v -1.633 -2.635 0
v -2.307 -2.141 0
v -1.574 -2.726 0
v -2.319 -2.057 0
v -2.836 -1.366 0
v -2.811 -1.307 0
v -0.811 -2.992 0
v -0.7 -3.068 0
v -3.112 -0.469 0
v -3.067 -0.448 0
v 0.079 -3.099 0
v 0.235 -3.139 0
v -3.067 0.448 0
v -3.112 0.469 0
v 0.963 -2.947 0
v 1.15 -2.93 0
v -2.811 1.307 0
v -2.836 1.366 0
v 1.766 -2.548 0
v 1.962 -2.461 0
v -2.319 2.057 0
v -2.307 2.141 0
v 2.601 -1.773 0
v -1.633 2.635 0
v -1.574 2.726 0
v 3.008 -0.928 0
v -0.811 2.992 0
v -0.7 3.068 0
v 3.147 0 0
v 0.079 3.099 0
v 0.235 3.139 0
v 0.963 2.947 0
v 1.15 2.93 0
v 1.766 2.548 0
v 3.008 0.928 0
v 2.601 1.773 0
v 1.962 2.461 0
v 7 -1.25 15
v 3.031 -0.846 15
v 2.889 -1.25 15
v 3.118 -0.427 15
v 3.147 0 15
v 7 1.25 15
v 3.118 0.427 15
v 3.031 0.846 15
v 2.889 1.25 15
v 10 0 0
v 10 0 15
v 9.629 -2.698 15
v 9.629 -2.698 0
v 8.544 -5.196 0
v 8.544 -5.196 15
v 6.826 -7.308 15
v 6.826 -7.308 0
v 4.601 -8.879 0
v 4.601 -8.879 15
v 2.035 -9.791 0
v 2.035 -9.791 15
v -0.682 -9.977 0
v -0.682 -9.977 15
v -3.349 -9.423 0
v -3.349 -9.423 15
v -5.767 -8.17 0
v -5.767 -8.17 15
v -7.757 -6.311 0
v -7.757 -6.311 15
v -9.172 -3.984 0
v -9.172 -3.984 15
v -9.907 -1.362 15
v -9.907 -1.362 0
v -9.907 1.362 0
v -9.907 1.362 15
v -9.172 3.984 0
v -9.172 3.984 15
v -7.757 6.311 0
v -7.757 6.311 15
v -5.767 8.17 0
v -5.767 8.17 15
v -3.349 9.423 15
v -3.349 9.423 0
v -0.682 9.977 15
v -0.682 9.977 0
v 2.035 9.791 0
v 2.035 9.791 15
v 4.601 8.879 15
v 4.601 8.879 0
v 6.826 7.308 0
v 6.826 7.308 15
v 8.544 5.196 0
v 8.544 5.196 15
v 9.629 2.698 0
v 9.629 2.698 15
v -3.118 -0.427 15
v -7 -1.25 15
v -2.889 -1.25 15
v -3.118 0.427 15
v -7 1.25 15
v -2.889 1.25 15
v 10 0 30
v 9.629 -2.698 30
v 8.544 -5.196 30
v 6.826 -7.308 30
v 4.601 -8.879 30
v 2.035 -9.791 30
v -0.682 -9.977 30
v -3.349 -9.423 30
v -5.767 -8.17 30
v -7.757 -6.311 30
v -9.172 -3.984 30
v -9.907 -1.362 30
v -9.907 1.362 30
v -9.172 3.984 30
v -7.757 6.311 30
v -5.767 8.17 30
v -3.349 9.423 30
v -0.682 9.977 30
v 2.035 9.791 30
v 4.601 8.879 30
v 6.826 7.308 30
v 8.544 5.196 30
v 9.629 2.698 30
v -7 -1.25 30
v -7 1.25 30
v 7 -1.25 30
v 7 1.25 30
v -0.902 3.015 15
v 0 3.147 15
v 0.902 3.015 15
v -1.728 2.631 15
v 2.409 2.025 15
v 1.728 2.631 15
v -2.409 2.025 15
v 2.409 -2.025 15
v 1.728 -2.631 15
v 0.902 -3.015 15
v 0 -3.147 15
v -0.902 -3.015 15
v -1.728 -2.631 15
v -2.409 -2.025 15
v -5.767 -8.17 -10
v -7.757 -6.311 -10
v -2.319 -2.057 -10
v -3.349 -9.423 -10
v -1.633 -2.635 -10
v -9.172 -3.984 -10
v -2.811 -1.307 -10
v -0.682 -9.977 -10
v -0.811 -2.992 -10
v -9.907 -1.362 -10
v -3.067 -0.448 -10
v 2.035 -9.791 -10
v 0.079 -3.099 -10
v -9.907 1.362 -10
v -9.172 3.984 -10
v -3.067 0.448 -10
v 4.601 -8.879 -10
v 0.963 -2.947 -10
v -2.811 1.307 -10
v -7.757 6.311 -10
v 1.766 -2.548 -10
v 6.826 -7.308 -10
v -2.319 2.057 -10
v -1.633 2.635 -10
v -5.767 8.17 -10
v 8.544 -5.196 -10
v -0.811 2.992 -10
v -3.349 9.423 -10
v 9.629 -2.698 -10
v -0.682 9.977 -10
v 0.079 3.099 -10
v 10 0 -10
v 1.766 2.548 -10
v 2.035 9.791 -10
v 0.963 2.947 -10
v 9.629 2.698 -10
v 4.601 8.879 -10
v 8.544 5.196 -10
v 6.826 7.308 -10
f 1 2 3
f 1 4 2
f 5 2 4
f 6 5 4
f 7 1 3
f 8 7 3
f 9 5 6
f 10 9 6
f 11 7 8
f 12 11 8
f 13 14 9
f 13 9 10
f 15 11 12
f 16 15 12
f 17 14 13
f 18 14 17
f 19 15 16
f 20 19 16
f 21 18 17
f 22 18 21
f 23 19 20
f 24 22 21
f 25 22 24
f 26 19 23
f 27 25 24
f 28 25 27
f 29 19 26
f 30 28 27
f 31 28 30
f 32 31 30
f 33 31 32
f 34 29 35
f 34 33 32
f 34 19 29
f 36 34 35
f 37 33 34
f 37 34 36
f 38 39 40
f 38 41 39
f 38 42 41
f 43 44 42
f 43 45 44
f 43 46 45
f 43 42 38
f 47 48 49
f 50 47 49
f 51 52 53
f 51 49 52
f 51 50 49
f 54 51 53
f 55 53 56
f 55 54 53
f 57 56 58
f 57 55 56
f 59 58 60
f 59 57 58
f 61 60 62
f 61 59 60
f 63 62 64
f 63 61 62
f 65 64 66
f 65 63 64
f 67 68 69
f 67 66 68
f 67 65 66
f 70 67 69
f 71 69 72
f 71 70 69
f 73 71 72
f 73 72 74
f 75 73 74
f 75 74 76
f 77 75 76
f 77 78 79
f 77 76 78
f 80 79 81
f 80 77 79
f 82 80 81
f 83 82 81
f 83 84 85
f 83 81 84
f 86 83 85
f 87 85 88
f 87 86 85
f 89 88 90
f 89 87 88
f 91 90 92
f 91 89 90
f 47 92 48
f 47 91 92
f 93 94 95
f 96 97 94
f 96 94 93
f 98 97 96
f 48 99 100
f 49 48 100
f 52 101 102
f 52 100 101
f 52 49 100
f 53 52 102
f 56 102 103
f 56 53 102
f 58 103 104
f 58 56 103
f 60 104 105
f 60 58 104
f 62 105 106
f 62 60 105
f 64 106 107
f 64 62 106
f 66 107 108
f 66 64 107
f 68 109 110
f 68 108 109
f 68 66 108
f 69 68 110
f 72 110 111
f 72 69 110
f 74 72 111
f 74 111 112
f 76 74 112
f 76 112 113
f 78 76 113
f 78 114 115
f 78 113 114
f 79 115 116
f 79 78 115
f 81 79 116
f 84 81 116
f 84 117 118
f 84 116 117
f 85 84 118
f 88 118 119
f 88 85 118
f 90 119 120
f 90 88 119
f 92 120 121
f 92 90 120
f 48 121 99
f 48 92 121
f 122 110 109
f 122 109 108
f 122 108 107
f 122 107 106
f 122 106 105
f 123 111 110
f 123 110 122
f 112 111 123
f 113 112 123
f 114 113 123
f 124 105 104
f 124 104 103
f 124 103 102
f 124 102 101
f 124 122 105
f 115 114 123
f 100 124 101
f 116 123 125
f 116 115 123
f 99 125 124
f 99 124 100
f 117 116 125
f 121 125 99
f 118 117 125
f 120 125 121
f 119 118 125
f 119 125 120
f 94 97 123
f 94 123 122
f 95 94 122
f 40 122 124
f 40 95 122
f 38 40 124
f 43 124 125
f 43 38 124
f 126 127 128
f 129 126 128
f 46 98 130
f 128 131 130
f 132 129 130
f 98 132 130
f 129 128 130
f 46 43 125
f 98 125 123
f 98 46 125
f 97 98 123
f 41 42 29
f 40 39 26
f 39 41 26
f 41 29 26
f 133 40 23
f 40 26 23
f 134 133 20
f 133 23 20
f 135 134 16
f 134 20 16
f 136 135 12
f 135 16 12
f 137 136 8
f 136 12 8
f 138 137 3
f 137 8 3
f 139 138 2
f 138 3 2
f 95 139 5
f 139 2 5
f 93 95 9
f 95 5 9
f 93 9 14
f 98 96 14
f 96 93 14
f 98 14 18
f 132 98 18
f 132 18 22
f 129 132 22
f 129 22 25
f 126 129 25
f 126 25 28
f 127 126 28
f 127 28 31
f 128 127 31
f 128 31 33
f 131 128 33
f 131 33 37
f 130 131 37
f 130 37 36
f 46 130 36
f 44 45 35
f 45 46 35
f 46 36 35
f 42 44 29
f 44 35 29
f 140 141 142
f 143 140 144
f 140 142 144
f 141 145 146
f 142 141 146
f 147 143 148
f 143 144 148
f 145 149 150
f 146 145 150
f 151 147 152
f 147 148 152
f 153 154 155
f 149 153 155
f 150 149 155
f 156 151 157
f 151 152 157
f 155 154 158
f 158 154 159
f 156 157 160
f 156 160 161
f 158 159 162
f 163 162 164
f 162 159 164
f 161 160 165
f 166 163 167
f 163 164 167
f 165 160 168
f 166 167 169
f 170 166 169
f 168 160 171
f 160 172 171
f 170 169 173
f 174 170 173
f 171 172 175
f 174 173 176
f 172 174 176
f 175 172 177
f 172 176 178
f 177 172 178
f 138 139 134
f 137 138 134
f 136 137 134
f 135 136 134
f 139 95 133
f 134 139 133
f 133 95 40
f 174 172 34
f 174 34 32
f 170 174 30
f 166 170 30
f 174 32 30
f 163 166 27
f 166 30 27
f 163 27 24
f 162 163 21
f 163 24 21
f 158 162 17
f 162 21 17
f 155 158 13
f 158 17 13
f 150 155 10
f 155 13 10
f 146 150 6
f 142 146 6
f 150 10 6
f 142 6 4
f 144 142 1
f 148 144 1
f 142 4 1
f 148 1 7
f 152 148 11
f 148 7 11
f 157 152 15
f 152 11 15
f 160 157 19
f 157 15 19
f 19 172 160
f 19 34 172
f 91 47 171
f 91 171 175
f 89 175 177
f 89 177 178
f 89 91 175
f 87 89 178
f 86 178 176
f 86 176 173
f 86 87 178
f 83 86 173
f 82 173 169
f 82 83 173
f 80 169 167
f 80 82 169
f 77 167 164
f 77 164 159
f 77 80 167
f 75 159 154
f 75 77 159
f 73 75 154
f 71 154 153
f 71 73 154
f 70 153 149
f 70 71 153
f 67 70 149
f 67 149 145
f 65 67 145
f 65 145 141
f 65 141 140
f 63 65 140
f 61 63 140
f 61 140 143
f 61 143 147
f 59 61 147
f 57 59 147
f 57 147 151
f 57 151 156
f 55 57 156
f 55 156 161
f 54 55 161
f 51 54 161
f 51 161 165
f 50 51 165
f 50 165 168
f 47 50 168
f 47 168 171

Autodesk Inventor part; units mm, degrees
ref_plane "YZ Plane" through (0, 0, 0) normal (1, 0, 0) x (0, 1, 0)
ref_plane "XZ Plane" through (0, 0, 0) normal (0, 1, 0) x (-1, 0, 0)
ref_plane "XY Plane" through (0, 0, 0) normal (0, 0, 1) x (1, 0, 0)
sketch "Sketch1" plane through (0, 0, 0) normal (0, 0, 1) x (1, 0, 0)
  line L0 (1.5658, -2.5487) -> (1.5658, 2.559) projected
  arc A0 (1.5658, 2.559) -> (1.5824, -2.5487) centre (0, 0) ccw projected
  line L1 (1.5824, -2.5487) -> (1.5658, -2.5487) projected
  circle A1 centre (0, 0) radius 10
  circle A2 centre (0, 0) radius 3.1
  line L2 (1.7658, 2.5479) -> (1.7658, -2.5479)
  point P0 (0, 0)
  dimension "d0" = 20
  dimension "d1" = 6.2
  dimension "d2" = 0.2
extrude "Extrusion1" add sketch "Sketch1" against normal blind 10 contours A1 | A2 L2 picked at (2.2105, 0)
sketch "Sketch2" plane through (0, 0, 0) normal (0, 0, 1) x (1, 0, 0)
  circle A0 centre (0, 0) radius 3.1474
  circle A1 centre (0, 0) radius 10
extrude "Extrusion2" add sketch "Sketch2" along normal blind 15
sketch "Sketch3" plane through (0, 0, 15) normal (0, 0, 1) x (1, 0, 0)
  line L0 (7, 1.25) -> (-7, 1.25)
  line L1 (-7, 1.25) -> (-7, -1.25)
  line L2 (-7, -1.25) -> (7, -1.25)
  line L3 (7, -1.25) -> (7, 1.25)
  circle A0 centre (0, 0) radius 10
  dimension "d7" = 2.5
  dimension "d8" = 14
  dimension "d9" = 1.25
  dimension "d10" = 7
extrude "Extrusion3" add sketch "Sketch3" along normal blind 15
equation "\"d9\" = 0.5 * d7"
equation "\"d10\" = 0.5 * d8"
properties part number "RollerMotorCoupler"
